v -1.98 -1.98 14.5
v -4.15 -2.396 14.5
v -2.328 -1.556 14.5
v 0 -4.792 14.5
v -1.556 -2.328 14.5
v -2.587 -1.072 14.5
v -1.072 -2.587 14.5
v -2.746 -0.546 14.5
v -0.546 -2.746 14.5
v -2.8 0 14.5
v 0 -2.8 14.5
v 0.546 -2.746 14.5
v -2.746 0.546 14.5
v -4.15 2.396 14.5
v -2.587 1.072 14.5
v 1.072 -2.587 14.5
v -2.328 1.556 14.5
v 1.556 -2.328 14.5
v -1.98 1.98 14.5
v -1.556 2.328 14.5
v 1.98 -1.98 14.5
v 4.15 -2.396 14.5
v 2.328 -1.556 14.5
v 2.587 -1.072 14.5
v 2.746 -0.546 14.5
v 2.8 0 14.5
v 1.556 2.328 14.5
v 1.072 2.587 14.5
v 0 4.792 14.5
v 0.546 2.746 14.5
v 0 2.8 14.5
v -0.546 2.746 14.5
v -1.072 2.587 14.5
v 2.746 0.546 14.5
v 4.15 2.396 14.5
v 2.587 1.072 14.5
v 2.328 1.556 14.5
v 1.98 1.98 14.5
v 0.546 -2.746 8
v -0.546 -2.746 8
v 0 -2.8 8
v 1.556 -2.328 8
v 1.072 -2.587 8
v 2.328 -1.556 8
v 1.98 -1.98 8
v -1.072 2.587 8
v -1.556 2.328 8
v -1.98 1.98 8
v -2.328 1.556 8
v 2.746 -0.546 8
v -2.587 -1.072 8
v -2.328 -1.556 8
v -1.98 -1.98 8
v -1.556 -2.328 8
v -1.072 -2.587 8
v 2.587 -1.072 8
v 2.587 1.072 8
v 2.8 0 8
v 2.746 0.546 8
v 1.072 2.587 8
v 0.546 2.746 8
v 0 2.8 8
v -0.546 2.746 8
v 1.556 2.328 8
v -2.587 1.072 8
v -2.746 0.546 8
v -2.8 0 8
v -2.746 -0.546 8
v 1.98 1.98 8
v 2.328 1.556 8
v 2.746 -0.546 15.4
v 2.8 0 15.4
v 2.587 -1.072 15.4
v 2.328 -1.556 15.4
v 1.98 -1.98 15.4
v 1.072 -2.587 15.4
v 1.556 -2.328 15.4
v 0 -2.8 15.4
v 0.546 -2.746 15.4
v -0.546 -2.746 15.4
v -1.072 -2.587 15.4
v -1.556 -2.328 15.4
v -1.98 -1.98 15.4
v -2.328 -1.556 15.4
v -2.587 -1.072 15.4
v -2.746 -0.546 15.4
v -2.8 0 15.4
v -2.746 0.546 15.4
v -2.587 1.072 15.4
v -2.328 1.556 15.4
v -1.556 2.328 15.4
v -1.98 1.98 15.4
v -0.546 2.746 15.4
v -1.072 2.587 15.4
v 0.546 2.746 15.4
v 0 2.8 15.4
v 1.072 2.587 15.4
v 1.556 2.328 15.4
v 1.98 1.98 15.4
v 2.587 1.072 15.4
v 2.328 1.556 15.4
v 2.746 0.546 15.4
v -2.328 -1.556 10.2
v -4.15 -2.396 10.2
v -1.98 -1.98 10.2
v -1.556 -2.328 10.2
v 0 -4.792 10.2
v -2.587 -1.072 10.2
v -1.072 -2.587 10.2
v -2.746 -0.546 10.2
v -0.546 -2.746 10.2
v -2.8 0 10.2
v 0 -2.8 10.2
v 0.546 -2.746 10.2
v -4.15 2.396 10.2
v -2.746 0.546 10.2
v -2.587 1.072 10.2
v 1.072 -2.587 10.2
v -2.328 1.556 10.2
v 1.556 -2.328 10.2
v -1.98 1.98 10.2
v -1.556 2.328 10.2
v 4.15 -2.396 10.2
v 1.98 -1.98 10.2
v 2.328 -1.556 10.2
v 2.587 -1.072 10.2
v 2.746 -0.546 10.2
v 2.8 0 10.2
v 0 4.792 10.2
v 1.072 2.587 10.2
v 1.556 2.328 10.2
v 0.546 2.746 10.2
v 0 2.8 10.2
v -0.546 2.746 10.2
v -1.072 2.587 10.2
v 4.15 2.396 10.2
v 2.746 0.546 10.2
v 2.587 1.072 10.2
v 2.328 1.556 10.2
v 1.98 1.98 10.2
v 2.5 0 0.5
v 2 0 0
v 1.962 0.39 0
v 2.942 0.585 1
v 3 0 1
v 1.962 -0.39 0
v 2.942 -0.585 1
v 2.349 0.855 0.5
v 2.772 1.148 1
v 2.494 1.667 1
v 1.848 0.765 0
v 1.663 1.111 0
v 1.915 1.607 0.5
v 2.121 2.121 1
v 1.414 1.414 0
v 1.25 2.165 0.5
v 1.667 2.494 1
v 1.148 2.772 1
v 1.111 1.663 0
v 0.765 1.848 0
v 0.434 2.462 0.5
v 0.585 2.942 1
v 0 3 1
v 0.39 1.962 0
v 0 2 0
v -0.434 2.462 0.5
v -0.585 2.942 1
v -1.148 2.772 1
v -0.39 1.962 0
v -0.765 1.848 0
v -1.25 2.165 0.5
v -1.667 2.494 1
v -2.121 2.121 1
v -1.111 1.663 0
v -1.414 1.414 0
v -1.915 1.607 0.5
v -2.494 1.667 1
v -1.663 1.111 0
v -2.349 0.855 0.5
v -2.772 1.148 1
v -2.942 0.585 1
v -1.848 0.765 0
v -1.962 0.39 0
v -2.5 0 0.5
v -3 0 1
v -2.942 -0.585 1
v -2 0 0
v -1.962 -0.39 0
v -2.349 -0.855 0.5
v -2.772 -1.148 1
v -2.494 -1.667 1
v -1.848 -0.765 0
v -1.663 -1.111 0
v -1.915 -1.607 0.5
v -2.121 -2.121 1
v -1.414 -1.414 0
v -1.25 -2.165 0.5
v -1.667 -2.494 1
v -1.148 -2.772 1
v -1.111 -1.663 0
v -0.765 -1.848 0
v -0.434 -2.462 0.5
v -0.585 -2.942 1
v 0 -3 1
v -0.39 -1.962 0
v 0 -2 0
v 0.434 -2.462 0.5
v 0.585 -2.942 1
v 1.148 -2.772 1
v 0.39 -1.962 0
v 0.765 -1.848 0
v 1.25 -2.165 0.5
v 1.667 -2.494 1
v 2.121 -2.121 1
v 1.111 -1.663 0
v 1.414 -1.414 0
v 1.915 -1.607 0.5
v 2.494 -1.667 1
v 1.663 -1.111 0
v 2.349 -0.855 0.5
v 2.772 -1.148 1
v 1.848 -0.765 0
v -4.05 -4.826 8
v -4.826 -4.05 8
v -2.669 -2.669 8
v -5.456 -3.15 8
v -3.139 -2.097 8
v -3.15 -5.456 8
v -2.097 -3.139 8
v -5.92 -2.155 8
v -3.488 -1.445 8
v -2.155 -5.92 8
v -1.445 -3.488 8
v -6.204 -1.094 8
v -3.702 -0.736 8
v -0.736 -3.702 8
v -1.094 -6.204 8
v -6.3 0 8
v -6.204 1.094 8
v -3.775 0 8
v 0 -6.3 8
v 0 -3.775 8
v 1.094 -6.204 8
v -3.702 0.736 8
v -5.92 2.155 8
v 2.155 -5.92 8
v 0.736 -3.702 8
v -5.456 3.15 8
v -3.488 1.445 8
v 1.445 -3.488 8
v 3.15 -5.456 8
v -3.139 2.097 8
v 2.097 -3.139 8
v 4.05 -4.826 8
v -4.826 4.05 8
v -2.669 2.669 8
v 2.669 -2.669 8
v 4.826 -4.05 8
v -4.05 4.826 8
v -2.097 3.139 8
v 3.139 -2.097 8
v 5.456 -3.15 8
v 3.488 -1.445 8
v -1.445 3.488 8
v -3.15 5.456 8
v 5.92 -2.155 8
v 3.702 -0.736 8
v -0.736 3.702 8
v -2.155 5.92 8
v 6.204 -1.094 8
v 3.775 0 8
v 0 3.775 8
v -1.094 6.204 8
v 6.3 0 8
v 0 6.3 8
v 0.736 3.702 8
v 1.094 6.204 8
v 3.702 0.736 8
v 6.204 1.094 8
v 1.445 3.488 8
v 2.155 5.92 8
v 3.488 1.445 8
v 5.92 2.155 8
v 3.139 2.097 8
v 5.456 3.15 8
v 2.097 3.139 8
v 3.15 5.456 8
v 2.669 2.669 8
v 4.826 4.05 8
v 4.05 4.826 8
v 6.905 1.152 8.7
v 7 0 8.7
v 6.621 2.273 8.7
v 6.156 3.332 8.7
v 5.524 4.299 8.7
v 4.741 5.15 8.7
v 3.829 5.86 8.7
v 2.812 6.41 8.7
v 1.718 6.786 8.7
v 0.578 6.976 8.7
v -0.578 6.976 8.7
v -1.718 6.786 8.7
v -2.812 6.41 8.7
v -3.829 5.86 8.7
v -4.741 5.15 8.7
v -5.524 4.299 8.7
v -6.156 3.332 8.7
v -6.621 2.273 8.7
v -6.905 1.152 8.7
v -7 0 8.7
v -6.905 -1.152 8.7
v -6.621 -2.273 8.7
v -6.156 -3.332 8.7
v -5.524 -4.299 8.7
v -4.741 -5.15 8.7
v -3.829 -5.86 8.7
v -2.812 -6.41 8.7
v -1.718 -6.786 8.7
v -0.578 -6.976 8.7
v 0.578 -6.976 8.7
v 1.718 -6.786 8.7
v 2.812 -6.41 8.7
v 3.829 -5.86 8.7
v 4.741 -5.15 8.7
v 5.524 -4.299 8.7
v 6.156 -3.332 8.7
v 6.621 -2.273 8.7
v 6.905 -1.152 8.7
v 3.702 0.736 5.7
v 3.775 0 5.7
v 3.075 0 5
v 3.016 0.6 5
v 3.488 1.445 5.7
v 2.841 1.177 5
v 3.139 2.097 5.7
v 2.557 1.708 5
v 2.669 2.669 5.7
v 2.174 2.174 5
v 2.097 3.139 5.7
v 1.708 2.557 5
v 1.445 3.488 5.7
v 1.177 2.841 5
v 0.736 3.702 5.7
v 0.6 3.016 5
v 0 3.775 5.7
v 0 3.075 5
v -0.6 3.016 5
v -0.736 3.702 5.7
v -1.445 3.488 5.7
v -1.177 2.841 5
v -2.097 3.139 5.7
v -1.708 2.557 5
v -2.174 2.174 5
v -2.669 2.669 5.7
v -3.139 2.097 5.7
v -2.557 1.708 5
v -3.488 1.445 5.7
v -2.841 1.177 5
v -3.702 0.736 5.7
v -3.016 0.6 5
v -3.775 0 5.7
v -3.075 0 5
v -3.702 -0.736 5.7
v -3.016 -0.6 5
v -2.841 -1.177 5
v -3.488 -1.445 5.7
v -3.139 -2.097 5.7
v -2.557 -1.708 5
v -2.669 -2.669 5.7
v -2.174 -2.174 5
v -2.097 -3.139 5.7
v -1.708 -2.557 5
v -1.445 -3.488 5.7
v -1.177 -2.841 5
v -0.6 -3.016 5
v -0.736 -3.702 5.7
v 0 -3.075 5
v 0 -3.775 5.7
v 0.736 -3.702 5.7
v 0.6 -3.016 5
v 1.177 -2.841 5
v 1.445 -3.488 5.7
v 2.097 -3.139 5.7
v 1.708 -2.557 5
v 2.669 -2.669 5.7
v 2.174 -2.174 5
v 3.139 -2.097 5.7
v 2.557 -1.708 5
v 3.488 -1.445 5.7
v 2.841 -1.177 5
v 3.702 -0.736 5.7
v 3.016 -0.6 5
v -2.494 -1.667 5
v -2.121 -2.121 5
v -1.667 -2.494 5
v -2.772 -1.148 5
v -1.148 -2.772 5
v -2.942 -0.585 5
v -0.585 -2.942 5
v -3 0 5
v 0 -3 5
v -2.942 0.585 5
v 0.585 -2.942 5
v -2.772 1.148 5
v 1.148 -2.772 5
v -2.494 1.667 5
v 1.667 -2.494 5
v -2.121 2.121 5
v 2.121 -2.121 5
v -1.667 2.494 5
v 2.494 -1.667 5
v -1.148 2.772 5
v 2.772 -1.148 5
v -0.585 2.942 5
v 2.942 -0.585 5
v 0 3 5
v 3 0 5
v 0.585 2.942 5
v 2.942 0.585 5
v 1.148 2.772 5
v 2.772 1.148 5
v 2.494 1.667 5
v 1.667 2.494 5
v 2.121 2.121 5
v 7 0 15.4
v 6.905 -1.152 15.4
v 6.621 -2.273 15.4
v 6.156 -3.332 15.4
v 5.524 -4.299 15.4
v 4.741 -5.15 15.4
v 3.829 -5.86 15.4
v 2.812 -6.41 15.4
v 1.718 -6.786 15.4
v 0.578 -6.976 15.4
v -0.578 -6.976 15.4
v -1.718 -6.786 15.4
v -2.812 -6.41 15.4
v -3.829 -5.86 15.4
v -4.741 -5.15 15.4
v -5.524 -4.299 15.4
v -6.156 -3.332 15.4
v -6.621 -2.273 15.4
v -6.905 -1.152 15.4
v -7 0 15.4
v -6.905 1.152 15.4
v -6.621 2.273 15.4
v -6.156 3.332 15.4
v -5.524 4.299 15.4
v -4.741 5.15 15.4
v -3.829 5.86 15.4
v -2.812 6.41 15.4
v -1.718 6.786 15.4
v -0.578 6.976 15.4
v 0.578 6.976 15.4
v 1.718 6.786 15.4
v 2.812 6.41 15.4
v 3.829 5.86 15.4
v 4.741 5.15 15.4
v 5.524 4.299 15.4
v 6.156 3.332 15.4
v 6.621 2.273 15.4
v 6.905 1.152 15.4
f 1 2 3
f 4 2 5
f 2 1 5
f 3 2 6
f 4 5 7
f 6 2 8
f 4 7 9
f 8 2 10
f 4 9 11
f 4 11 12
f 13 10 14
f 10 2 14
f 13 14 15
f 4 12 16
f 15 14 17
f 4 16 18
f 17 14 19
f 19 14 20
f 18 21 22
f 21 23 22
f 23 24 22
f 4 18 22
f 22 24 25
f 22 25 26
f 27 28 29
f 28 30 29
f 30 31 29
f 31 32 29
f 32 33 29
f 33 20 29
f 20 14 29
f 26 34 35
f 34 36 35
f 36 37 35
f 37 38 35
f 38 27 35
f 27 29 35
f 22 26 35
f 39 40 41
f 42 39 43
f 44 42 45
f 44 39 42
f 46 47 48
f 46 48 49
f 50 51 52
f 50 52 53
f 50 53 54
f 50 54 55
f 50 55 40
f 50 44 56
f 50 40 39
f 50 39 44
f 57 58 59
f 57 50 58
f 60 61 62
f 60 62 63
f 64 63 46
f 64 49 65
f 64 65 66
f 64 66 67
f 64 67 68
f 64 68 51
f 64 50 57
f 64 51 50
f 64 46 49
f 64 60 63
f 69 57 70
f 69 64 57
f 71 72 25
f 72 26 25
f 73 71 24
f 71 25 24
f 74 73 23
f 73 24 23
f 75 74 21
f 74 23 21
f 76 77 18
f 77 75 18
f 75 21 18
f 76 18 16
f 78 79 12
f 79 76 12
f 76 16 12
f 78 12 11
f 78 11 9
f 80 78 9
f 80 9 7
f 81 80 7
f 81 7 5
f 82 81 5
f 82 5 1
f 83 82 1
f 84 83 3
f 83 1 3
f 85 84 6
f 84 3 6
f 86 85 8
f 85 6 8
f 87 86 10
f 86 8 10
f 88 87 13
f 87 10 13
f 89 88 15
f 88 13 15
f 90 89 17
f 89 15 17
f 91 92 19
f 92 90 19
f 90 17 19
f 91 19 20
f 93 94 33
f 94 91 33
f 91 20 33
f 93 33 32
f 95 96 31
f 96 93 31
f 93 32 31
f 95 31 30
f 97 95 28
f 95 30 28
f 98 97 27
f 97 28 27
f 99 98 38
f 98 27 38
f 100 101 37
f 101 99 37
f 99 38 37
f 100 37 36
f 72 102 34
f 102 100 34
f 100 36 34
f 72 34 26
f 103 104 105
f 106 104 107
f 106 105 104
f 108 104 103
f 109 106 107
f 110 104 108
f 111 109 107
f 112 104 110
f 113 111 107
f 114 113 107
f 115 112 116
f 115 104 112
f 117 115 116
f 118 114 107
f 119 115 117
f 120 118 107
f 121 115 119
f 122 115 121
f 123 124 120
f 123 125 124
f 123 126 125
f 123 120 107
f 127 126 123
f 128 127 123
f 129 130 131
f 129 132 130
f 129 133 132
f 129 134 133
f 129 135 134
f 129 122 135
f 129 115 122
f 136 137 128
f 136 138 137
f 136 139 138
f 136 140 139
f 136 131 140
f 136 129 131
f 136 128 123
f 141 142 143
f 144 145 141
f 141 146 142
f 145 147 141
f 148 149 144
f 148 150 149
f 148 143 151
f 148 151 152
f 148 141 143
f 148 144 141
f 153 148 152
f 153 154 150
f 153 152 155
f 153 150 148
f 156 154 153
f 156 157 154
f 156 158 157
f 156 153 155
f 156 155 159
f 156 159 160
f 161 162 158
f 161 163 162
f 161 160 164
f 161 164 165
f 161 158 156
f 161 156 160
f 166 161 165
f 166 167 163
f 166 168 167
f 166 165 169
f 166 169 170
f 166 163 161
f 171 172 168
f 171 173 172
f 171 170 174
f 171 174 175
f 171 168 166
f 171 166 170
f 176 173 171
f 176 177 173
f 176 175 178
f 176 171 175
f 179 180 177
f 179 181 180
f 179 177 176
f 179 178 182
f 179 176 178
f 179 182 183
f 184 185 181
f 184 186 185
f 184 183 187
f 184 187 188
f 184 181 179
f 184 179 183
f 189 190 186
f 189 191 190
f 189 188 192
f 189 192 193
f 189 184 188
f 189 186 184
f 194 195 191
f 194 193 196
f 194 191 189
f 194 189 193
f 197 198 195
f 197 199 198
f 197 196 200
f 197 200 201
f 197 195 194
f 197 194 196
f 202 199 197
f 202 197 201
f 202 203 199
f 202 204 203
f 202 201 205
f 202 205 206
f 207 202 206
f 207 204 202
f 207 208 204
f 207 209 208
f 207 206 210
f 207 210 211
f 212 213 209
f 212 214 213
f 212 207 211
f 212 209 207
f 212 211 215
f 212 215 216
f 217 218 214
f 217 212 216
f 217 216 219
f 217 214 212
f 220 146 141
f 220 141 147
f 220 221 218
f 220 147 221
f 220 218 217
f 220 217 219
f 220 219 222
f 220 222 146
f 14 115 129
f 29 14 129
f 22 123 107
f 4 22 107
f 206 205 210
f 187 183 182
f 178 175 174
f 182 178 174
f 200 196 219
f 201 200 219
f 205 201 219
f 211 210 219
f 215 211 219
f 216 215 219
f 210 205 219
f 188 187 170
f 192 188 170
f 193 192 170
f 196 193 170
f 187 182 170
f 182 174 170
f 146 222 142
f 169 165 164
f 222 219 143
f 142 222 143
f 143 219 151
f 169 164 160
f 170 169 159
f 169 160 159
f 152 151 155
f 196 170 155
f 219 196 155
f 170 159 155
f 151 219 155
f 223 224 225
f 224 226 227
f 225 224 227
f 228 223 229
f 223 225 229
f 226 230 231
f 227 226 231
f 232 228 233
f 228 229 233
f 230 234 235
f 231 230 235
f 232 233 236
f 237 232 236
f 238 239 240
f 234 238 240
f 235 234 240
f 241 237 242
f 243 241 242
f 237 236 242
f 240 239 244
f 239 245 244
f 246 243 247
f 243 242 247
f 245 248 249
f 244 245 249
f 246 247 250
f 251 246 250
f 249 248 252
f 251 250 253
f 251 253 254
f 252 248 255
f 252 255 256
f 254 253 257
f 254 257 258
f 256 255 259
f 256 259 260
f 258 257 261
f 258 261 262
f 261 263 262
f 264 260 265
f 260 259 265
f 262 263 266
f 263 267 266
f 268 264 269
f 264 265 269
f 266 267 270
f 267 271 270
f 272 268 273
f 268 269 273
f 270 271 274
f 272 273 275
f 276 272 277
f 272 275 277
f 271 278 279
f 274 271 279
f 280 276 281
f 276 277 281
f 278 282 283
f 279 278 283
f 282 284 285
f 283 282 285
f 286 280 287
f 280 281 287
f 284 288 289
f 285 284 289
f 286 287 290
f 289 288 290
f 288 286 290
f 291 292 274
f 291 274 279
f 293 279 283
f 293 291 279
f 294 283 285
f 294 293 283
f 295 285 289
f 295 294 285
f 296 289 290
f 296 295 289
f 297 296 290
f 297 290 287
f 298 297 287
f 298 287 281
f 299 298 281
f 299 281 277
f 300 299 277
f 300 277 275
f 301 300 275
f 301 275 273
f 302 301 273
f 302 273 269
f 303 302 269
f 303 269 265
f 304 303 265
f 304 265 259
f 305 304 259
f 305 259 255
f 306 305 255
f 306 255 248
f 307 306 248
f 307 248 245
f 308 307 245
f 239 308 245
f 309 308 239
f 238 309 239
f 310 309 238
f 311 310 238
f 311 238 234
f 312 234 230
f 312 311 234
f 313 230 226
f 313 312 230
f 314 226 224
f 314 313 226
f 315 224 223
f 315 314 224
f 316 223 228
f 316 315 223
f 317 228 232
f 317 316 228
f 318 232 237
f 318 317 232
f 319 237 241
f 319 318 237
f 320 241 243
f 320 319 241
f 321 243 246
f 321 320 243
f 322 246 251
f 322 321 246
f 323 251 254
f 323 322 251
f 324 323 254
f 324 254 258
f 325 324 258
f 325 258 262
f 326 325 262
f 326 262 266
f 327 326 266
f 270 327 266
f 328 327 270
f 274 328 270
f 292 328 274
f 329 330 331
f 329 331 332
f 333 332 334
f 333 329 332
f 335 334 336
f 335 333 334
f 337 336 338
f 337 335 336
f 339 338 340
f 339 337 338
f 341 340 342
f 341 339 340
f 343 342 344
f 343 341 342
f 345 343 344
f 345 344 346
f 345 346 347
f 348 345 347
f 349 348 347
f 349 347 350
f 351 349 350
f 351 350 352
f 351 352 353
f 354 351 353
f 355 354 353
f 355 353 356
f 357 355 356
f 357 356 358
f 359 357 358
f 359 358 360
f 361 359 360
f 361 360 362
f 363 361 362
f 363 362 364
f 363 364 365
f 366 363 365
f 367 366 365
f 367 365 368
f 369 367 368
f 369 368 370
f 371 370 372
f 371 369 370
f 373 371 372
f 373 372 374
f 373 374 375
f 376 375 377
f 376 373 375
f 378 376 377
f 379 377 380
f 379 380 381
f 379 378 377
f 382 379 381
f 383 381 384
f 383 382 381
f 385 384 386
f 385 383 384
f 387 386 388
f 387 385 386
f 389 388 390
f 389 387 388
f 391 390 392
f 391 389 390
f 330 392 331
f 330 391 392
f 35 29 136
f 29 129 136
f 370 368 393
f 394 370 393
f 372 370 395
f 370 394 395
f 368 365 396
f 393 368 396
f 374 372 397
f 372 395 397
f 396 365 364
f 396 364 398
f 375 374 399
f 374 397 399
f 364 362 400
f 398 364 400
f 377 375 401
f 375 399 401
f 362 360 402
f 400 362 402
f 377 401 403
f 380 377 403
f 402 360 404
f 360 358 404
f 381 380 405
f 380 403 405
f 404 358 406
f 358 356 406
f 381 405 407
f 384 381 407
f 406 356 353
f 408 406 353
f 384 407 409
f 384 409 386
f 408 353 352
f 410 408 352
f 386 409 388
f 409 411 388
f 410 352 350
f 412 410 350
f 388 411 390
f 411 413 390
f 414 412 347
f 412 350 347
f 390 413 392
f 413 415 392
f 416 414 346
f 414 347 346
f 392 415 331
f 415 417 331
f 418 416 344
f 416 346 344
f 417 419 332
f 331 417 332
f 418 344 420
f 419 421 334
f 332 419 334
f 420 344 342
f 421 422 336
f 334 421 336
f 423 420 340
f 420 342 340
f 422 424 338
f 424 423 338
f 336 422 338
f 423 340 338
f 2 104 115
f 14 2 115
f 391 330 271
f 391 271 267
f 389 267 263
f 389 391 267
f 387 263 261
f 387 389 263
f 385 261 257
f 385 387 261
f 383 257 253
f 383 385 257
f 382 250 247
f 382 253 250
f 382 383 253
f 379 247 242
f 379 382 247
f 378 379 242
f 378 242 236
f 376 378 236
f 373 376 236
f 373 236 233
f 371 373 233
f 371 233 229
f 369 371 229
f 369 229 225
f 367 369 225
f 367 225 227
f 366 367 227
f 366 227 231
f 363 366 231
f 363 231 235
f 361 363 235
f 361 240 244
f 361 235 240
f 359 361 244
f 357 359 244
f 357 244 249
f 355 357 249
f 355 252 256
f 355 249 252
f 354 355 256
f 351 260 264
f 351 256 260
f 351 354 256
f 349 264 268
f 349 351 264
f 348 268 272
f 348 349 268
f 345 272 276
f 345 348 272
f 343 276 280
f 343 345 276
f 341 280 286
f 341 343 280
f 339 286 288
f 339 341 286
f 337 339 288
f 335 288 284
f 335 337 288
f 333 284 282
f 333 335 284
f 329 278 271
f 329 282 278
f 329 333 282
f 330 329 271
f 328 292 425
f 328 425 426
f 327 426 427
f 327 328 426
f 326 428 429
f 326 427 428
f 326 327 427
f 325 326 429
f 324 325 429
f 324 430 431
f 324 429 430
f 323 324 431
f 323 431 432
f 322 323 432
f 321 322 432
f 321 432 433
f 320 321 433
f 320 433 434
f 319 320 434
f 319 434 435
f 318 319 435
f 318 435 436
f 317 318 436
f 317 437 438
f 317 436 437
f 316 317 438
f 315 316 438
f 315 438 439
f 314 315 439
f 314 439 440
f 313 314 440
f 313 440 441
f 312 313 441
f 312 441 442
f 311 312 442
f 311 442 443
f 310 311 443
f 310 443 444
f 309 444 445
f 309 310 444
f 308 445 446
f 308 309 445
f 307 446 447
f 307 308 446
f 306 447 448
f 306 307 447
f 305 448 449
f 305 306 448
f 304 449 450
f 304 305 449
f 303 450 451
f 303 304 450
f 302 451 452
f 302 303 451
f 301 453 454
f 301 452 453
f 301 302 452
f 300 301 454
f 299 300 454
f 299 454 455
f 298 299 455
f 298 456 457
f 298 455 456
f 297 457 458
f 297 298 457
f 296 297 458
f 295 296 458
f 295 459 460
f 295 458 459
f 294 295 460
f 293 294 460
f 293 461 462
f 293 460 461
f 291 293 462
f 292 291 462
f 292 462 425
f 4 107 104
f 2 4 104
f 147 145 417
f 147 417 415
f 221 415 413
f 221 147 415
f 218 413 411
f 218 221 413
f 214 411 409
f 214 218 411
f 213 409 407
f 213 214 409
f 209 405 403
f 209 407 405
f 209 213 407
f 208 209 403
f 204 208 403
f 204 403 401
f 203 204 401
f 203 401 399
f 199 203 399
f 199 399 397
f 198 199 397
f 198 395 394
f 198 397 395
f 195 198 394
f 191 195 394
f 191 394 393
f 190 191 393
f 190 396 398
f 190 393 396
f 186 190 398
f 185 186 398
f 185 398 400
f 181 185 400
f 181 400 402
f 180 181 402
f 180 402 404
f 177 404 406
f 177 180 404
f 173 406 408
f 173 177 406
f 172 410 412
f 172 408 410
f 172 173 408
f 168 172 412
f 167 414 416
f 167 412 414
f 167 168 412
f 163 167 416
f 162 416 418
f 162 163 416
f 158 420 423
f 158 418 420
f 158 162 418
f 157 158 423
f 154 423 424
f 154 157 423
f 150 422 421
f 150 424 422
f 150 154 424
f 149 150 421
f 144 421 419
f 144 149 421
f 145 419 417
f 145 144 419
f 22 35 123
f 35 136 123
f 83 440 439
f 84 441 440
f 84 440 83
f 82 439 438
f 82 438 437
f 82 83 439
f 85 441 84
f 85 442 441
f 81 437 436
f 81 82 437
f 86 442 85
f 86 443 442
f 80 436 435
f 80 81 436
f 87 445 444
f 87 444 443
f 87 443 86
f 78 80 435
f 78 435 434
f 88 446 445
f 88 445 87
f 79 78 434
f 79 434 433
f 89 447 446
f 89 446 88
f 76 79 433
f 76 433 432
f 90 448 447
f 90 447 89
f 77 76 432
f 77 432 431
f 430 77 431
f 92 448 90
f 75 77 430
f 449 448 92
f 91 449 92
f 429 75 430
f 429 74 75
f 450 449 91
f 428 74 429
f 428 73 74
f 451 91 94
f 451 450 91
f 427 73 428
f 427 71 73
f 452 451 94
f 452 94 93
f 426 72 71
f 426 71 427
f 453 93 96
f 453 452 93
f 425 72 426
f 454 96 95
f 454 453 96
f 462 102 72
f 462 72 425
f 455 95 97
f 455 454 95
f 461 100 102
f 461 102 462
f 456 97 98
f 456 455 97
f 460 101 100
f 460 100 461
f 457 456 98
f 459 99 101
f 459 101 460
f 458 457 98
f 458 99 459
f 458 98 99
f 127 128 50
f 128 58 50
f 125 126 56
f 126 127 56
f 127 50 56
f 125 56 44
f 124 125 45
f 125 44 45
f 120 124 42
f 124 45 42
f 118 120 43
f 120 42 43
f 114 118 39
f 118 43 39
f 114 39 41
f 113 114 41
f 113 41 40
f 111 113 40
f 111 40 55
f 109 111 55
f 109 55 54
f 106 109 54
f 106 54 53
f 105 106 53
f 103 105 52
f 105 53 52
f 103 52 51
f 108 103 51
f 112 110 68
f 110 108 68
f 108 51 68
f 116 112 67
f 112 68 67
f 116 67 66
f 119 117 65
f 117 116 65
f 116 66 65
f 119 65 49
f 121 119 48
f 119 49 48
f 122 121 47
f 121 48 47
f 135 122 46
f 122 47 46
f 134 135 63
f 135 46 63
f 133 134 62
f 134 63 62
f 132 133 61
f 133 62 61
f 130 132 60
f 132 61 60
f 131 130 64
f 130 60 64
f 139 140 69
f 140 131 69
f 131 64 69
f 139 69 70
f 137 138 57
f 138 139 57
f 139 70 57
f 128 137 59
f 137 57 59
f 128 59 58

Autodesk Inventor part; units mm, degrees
ref_plane "YZ Plane" through (0, 0, 0) normal (1, 0, 0) x (0, 1, 0)
ref_plane "XZ Plane" through (0, 0, 0) normal (0, 1, 0) x (-1, 0, 0)
ref_plane "XY Plane" through (0, 0, 0) normal (0, 0, 1) x (1, 0, 0)
sketch "Sketch1" plane through (0, 0, 0) normal (0, 0, 1) x (1, 0, 0)
  circle A0 centre (0, 0) radius 3
  dimension "d0" = 6
extrude "Extrusion1" add sketch "Sketch1" along normal blind 5
sketch "Sketch2" plane through (0, 0, 5) normal (0, 0, 1) x (1, 0, 0)
  circle A0 centre (0, 0) radius 3.775
  dimension "d3" = 7.55
extrude "Extrusion2" add sketch "Sketch2" along normal blind 3
sketch "Sketch3" plane through (0, 0, 8) normal (0, 0, 1) x (1, 0, 0)
  circle A0 centre (0, 0) radius 7
  circle A1 centre (0, 0) radius 2.8
  dimension "d7" = 14
  dimension "d25" = 5.6
extrude "Extrusion3" add sketch "Sketch3" along normal blind 2.2
sketch "Sketch5" plane through (0, 0, 10.2) normal (0, 0, 1) x (1, 0, 0)
  line L0 (-4.15, 2.396) -> (0, 4.792)
  line L1 (0, 4.792) -> (4.15, 2.396)
  line L2 (4.15, 2.396) -> (4.15, -2.396)
  line L3 (4.15, -2.396) -> (0, -4.792)
  line L4 (0, -4.792) -> (-4.15, -2.396)
  line L5 (-4.15, -2.396) -> (-4.15, 2.396)
  circle A0 centre (0, 0) radius 7
  dimension "d19" = 8.3
extrude "Extrusion5" add sketch "Sketch5" along normal blind 4.3
sketch "Sketch6" plane through (0, 0, 14.5) normal (0, 0, 1) x (1, 0, 0)
  circle A0 centre (0, 0) radius 7
  circle A1 centre (0, 0) radius 2.8
  dimension "d24" = 5.6
extrude "Extrusion6" add sketch "Sketch6" along normal blind 0.9
chamfer "Chamfer1" distance 1 angle 45 1 edges at (-3, 0, 0)
chamfer "Chamfer2" distance 0.7 angle 45 2 edges at (-3.775, 0, 5) (-7, 0, 8)
equation "\"m3_hex_s\" = 5.4"
equation "\"m3_hex_m\" = 2.3"
equation "\"m3_rund_d\" = 5.95"
equation "\"m3_rund_m\" = 2.6"
equation "\"l______________l\" = 0"
equation "\"Lengths\" = 0"
equation "\"L20\" = 0"
equation "\"L25\" = 0"
equation "\"L16\" = 0"
equation "\"L12\" = 0"
equation "\"L8\" = 0"
equation "\"L4\" = 0"
equation "\"m3_s\" = 5.4"
equation "\"m3_m\" = 2.3"
properties part number "Shaft_to_beam_interface_3DPrint"
